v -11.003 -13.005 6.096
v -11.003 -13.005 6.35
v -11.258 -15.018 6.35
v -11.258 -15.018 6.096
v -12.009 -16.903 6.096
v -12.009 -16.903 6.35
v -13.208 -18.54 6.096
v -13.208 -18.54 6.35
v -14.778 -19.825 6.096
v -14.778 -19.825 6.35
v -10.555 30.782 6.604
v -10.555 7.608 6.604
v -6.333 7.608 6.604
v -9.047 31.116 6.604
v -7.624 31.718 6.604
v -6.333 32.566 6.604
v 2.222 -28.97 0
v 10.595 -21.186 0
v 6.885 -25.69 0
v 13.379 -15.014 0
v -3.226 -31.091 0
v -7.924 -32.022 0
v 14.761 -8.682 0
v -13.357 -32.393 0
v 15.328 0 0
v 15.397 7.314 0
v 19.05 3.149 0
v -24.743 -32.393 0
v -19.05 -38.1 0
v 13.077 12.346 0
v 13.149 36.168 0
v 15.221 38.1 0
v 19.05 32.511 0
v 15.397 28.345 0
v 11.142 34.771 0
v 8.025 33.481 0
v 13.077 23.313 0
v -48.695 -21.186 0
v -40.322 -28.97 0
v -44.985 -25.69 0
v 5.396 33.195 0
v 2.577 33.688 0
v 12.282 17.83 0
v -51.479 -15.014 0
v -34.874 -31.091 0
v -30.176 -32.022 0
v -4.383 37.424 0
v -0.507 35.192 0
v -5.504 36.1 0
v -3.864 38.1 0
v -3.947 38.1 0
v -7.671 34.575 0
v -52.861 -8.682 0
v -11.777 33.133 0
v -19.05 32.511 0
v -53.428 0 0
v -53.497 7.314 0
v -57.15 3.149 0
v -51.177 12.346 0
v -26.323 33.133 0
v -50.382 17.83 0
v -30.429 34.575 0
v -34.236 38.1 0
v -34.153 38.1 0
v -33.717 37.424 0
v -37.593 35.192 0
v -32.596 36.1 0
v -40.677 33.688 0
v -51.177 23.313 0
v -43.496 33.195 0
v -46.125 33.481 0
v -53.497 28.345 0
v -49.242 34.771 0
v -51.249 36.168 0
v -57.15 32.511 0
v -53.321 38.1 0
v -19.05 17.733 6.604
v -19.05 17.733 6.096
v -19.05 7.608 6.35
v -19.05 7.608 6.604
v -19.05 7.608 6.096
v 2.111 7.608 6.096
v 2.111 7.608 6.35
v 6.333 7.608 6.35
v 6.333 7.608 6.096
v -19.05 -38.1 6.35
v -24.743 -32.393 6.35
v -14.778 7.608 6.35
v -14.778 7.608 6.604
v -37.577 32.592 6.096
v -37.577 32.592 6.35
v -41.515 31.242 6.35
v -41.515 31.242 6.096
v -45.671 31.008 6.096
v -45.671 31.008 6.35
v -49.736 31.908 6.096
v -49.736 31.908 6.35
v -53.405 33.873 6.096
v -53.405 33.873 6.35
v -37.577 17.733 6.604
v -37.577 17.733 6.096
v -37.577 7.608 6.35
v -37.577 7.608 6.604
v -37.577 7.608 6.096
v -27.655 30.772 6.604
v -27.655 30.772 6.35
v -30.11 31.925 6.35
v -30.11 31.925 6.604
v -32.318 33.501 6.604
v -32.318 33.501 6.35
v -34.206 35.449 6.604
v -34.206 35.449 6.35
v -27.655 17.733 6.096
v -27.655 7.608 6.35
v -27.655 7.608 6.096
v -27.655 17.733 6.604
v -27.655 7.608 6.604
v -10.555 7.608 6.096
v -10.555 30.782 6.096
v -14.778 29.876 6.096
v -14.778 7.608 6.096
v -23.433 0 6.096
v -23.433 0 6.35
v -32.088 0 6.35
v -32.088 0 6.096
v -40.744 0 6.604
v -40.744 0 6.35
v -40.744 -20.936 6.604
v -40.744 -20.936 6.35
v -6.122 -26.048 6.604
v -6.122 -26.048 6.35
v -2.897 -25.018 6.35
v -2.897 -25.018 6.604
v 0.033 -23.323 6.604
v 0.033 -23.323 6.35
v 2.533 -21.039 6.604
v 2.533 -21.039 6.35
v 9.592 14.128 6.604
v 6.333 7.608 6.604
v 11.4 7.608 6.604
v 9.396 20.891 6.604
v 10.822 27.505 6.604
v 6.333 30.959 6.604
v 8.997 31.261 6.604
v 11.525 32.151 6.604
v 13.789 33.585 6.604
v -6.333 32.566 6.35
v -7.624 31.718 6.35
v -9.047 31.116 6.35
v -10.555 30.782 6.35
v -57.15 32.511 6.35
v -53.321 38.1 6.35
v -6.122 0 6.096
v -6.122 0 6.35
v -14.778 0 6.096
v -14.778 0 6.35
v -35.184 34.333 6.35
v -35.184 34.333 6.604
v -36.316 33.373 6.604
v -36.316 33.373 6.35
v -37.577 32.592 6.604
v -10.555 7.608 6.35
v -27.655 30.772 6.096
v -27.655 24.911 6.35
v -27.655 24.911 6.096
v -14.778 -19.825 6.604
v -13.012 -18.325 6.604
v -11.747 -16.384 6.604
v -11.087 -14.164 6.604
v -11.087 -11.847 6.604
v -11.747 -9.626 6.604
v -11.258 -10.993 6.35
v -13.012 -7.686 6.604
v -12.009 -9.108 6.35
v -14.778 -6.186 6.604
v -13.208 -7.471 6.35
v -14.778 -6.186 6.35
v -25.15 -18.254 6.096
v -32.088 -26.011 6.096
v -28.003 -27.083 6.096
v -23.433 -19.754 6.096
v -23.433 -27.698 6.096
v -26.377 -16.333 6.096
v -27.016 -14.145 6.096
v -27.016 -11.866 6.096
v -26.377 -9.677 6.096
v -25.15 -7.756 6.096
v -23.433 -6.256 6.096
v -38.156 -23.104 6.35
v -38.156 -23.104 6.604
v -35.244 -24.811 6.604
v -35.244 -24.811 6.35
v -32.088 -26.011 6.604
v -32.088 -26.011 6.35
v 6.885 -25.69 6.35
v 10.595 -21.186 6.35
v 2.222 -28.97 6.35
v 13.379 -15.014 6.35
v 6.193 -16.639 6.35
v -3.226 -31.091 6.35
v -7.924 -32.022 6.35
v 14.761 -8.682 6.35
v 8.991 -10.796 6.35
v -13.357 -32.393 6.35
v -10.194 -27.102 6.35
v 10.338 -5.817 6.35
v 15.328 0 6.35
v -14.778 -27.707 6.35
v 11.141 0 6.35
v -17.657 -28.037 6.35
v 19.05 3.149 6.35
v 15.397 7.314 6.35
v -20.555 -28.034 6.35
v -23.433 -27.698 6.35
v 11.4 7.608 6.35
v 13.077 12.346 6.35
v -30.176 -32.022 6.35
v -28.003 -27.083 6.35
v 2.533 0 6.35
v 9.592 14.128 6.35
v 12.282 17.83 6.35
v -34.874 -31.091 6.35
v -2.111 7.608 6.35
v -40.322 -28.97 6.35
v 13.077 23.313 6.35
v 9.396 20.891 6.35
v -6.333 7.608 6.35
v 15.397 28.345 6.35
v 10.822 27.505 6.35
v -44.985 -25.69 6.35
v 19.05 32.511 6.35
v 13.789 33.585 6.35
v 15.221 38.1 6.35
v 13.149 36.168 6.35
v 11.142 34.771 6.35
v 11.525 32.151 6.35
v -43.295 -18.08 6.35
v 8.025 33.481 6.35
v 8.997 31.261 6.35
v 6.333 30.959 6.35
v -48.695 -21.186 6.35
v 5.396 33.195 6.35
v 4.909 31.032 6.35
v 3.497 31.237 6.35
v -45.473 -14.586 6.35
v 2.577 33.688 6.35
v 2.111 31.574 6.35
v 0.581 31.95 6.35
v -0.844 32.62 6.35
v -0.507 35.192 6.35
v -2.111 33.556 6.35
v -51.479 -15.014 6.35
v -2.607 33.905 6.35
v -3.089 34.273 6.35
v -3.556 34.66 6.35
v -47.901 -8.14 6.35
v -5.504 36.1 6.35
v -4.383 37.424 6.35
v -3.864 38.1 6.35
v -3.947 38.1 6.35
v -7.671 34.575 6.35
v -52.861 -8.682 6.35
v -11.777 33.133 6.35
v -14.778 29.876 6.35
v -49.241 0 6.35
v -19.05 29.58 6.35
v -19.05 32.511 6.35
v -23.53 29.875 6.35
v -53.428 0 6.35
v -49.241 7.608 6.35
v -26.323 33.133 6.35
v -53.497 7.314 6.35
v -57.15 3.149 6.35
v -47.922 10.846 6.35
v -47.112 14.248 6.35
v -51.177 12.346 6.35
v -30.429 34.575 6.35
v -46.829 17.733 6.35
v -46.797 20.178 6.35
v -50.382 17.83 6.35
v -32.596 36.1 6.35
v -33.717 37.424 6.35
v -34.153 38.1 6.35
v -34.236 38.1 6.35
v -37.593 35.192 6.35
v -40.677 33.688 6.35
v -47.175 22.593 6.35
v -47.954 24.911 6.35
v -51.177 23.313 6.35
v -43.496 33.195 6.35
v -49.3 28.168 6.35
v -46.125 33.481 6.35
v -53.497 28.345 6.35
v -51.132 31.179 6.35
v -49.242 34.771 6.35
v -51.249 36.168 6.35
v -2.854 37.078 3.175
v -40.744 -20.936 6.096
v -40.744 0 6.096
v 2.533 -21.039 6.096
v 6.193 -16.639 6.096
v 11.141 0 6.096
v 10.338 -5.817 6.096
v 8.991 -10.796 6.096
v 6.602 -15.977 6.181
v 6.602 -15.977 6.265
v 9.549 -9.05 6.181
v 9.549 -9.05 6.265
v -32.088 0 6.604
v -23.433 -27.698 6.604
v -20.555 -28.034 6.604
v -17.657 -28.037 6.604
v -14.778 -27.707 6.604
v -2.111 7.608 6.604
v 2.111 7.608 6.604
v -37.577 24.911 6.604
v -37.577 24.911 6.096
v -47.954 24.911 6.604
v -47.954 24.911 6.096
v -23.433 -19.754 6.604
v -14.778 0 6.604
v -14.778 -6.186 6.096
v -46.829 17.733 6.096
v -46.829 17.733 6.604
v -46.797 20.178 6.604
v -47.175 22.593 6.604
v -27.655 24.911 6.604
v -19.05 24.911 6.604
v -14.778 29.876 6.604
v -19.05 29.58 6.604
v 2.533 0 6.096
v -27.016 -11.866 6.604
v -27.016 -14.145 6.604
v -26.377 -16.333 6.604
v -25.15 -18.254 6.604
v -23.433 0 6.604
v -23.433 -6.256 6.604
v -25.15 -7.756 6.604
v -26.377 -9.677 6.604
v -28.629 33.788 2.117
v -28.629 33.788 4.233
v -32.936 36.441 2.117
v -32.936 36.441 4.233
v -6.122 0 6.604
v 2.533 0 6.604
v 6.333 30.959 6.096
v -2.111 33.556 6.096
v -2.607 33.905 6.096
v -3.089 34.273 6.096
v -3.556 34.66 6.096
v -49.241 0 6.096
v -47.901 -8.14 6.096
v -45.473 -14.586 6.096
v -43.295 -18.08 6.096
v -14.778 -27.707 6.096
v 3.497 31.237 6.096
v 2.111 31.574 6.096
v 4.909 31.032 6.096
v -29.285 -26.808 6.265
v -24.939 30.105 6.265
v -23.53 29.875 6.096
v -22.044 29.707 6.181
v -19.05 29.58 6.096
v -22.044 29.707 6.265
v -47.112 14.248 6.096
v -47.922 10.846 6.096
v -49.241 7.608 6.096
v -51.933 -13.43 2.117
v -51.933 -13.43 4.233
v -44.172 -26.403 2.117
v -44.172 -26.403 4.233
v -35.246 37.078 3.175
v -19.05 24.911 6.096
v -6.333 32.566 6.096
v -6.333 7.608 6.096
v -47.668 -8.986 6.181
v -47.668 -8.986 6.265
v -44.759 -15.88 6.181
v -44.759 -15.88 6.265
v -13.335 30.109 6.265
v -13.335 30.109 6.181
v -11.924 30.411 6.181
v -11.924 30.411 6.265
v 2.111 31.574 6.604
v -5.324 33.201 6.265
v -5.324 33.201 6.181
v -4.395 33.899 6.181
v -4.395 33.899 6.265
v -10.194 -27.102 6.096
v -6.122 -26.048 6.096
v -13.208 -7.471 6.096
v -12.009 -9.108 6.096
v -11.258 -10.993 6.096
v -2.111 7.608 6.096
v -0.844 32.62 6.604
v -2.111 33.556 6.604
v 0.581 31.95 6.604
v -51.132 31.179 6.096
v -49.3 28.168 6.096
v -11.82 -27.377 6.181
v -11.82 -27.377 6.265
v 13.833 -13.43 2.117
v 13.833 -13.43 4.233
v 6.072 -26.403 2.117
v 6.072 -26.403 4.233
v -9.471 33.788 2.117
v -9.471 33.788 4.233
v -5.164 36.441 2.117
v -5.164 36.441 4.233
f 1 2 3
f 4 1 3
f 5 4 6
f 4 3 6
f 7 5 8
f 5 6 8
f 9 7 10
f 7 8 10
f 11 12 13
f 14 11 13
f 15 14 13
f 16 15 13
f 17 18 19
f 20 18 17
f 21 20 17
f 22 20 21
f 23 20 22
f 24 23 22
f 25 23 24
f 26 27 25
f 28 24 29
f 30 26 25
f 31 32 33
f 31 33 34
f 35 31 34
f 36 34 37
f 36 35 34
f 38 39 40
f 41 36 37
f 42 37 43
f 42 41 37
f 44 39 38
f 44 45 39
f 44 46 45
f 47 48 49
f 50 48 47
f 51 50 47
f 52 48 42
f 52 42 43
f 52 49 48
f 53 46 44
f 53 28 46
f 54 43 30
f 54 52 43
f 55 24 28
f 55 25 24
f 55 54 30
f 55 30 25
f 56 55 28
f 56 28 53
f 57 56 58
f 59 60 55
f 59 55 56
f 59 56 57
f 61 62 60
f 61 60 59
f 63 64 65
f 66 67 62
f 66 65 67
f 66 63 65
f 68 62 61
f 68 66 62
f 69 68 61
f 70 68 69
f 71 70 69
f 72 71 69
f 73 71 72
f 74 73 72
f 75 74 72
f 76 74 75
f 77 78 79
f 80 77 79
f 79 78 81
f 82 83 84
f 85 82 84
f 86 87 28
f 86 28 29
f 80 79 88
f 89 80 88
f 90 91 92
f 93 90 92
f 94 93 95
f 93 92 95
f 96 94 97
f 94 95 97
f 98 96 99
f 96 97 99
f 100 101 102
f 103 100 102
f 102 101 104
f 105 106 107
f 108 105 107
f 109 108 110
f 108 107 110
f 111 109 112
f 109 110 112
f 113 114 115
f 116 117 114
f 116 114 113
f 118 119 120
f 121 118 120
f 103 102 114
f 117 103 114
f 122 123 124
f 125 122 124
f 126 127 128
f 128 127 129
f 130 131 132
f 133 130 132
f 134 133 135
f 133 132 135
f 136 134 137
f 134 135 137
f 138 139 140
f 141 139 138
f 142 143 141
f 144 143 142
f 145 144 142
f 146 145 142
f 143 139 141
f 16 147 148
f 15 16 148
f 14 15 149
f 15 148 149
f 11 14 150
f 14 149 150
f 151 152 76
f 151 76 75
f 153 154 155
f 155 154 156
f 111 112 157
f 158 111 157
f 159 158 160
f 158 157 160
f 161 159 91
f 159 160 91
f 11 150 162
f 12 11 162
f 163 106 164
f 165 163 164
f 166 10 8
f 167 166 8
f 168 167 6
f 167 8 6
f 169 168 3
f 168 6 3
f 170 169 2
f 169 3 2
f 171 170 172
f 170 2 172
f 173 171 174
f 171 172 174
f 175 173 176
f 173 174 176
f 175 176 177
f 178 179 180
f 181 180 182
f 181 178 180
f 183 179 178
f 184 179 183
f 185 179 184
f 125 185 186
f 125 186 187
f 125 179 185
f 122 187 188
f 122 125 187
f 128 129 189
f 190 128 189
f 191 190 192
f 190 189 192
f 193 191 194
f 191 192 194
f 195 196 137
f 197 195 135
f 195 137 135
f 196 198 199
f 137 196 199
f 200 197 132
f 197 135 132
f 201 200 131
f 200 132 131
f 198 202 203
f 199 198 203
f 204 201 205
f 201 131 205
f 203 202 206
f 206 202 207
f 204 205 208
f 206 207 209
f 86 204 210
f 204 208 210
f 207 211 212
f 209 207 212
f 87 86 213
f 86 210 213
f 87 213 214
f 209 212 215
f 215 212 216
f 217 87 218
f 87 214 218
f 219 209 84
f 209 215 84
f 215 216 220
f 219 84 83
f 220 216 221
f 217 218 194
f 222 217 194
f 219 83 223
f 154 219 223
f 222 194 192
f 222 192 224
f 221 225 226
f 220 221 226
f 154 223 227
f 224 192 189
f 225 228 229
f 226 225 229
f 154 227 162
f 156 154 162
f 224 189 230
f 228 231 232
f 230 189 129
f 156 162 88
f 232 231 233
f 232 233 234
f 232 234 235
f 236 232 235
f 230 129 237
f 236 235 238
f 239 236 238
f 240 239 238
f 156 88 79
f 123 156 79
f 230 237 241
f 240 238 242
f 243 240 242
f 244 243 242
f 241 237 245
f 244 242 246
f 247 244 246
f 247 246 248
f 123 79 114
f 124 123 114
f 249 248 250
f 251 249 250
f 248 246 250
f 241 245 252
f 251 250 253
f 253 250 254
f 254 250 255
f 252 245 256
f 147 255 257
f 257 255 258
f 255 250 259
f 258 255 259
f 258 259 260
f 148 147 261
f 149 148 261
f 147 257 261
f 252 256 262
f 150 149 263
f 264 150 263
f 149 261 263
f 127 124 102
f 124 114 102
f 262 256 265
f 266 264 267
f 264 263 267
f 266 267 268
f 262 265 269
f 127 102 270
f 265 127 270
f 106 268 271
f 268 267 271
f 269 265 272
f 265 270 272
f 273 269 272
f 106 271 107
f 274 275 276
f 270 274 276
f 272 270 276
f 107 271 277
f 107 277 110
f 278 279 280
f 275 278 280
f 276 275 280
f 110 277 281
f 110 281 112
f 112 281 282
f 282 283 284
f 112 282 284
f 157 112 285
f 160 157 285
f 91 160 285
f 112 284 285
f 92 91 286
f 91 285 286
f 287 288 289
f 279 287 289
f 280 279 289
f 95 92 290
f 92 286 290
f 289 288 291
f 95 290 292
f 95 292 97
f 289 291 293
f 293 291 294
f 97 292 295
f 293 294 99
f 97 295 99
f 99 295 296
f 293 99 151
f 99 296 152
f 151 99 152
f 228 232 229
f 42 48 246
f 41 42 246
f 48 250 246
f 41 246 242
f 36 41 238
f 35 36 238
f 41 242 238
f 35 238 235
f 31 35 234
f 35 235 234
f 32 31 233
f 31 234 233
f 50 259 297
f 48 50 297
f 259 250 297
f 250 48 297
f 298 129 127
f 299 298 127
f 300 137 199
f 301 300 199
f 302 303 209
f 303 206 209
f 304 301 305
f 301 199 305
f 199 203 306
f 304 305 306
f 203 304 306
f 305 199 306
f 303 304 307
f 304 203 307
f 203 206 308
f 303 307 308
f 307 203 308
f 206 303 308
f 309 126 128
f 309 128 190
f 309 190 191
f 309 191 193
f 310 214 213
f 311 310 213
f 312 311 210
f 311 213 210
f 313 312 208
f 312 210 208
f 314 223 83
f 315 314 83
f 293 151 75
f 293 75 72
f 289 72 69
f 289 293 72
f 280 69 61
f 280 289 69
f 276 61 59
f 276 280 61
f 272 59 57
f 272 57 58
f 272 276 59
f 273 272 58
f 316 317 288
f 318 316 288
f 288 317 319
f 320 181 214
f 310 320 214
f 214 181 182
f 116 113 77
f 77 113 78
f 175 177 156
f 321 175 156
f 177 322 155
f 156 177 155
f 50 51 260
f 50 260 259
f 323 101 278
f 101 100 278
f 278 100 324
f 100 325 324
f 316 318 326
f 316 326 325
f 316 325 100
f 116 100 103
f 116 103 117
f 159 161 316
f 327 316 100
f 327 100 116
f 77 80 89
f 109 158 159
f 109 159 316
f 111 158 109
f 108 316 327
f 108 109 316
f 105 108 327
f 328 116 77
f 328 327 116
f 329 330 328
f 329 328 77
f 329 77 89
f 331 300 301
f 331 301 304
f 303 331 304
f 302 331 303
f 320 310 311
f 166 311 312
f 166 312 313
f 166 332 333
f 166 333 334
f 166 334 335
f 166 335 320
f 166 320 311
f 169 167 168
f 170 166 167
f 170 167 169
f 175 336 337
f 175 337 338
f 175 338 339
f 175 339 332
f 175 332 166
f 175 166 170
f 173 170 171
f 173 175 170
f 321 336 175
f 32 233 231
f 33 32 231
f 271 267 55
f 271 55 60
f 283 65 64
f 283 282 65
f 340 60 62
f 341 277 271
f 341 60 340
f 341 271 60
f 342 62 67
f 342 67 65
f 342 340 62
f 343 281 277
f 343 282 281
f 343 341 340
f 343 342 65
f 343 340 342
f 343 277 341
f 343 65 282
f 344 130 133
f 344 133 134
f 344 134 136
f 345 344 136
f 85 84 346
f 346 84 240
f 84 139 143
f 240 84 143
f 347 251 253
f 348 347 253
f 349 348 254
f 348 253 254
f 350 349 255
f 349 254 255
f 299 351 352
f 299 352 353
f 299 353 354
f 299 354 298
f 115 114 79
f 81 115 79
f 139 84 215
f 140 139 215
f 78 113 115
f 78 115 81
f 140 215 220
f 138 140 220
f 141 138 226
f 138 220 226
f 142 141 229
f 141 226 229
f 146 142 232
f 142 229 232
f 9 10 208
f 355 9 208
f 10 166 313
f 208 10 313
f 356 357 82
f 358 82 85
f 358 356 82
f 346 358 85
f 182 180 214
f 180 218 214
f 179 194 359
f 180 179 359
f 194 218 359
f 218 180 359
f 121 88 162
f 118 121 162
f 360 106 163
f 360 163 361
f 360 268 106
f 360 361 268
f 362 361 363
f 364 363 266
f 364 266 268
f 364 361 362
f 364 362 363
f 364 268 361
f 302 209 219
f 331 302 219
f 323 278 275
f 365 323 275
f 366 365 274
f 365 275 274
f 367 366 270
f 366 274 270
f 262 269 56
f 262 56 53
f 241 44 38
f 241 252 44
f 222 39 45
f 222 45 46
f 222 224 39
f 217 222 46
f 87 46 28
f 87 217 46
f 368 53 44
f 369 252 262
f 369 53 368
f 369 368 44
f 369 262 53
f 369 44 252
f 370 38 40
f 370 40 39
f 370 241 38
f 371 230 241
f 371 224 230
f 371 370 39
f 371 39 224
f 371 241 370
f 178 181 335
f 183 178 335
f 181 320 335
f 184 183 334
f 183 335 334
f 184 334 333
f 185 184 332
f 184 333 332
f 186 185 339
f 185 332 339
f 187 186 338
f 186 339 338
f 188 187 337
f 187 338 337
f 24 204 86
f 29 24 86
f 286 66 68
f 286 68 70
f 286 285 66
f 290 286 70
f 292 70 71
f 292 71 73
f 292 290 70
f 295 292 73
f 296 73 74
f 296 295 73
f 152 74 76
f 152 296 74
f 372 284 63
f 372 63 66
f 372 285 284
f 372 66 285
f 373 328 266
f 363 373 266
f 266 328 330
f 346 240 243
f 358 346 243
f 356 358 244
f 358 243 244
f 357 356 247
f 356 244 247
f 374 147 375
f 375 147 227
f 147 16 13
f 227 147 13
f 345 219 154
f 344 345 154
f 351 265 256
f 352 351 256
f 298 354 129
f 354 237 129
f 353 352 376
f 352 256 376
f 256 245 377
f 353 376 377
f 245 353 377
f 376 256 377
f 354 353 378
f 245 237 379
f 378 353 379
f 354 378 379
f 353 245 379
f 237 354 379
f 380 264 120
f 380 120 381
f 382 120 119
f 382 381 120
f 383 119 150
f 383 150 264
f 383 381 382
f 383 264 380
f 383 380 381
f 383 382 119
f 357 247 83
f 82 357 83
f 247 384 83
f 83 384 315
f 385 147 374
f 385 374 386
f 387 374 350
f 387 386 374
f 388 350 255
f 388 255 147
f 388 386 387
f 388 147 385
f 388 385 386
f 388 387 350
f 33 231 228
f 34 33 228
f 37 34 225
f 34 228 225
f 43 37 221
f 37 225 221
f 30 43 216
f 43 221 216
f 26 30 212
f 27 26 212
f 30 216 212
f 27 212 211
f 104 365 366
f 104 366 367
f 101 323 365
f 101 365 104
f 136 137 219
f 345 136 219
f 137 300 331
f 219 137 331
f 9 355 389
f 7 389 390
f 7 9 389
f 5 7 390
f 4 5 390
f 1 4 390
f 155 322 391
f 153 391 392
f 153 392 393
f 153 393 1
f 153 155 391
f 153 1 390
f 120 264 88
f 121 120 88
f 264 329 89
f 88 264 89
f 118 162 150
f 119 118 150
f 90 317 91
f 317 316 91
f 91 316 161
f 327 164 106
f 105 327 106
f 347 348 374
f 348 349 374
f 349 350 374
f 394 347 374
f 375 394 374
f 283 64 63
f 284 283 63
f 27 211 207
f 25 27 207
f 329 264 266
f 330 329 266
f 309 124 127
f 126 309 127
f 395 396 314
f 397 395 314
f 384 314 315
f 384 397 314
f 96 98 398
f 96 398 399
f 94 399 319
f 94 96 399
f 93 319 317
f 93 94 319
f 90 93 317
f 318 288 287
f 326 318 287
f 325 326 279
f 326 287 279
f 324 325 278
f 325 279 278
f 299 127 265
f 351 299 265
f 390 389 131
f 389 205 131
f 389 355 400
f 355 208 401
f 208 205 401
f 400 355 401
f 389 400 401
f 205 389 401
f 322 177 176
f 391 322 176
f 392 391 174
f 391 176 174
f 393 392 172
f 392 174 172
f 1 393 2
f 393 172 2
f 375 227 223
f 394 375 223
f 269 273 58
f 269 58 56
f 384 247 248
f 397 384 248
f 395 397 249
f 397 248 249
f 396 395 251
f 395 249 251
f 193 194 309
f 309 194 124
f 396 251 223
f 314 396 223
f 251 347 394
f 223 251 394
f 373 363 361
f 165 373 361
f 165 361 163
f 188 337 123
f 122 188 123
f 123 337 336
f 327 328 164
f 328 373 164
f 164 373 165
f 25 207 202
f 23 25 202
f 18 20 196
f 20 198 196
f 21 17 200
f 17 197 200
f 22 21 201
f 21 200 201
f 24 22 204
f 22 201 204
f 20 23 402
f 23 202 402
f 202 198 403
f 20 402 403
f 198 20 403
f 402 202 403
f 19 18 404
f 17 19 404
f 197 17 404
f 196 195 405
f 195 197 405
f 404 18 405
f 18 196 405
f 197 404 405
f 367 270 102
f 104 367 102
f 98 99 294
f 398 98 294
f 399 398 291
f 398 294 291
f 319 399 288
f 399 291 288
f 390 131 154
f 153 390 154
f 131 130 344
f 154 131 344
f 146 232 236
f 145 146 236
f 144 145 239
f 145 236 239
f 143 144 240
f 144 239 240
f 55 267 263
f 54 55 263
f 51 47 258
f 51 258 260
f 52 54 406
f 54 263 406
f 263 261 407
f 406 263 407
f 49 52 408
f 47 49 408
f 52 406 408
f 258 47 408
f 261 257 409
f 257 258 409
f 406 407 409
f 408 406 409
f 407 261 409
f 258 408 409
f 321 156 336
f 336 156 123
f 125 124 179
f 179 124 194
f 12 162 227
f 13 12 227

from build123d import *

# Parameters (mm, degrees)
F0_W     = 38.1
F0_H     = 76.2
F1_DEPTH = 6.35
F3_DEPTH = 6.35
F5_W     = 8.6051712304
F5_H     = 10.1246496194
F6_DEPTH = 0.254
F8_DEPTH = 0.254


with BuildPart() as f1:
    # F0 (on Top) → F1 (new body)
    with BuildSketch(Plane.XY):
        Rectangle(F0_W, F0_H)
    extrude(amount=F1_DEPTH)

    # F2 (on face) → F3 (cut)
    with BuildSketch(Plane.XY.offset(6.35)):
        with BuildLine():
            Line((-3.9472845383, 38.1), (-3.8636967831, 38.1))
            add(Edge.make_bspline(
                [(-3.9472845383, 38.1), (-3.9204592136, 38.1251084892), (-3.8998782769, 38.127174182), (-3.8636967831, 38.1)],
                knots=[0.4563634252, 0.4563634252, 0.4563634252, 0.4563634252, 0.4871979804, 0.4871979804, 0.4871979804, 0.4871979804], degree=3))
        make_face()
        with BuildLine():
            add(Edge.make_bspline(
                [(-19.05, 32.5106605887), (-6.1091777888, 32.3092094071), (-4.3443097915, 37.7283845811), (-3.9472845383, 38.1)],
                knots=[0, 0, 0, 0, 0.4563634252, 0.4563634252, 0.4563634252, 0.4563634252], degree=3))
            Line((-3.9472845383, 38.1), (-19.05, 38.1))
            Line((-19.05, 38.1), (-19.05, 32.5106605887))
        make_face()
        with BuildLine():
            Line((19.05, -38.1), (19.05, 3.1485415529))
            Line((19.05, 3.1485415529), (15.3276119381, 0))
            add(Edge.make_bspline(
                [(15.3276119381, 0), (15.1655543596, -11.4850010723), (13.7070389464, -32.0684760809), (-13.3565291762, -32.3926247656)],
                knots=[0, 0, 0, 0, 43.2673328352, 43.2673328352, 43.2673328352, 43.2673328352], degree=3))
            Line((-13.3565291762, -32.3926247656), (-19.05, -38.1))
            Line((-19.05, -38.1), (19.05, -38.1))
        make_face()
        with BuildLine():
            Line((19.05, 3.1485415529), (19.05, 32.5106605887))
            ThreePointArc((19.05, 32.5106605887), (12.2820636744, 17.8296010708), (19.05, 3.1485415529))
        make_face()
        Polygon((15.2206547403, 38.1), (19.05, 32.5106605887), (19.05, 38.1), align=None)
        with BuildLine():
            add(Edge.make_bspline(
                [(-3.8636967831, 38.1), (-3.843737622, 38.0850096328), (-3.0988894532, 37.3648301618), (5.2937592339, 27.6119129043), (15.2206547403, 38.1)],
                knots=[0.4871979804, 0.4871979804, 0.4871979804, 0.4871979804, 0.5042075561, 1, 1, 1, 1], degree=3))
            Line((15.2206547403, 38.1), (-3.8636967831, 38.1))
        make_face()
    extrude(amount=-F3_DEPTH, mode=Mode.SUBTRACT)

    # F4: F1 across face


with BuildPart() as f1_1:
    add(f1.part)
    add(f1.part.mirror(Plane(origin=(-19.05, -2.7946697056, 3.175), x_dir=(0, -1, 0), z_dir=(-1, 0, 0))))

    # F5 (on face) → F6 (cut)
    with BuildSketch(Plane.XY.offset(6.35)):
        with BuildLine():
            ThreePointArc((-37.5772565603, 32.5917619335), (-45.671204203, 31.008244813), (-53.4049263852, 33.873389857))
            ThreePointArc((-53.4049263852, 33.873389857), (-50.1581802259, 29.7090041206), (-47.9535559256, 24.9107647687))
            Line((-47.9535559256, 24.9107647687), (-37.5772565603, 24.9107647687))
            Line((-37.5772565603, 24.9107647687), (-37.5772565603, 32.5917619335))
        make_face()
        with BuildLine():
            Line((-37.5772565603, 17.7330877632), (-46.8293691707, 17.7330877632))
            ThreePointArc((-46.8293691707, 17.7330877632), (-47.4515529833, 12.5316587806), (-49.2414900542, 7.6084381438))
            Line((-49.2414900542, 7.6084381438), (-37.5772565603, 7.6084381438))
            Line((-37.5772565603, 7.6084381438), (-37.5772565603, 17.7330877632))
        make_face()
        with Locations((-23.3525856152, 12.6707629535)):
            Rectangle(F5_W, F5_H)
        with BuildLine():
            add(Edge.make_bspline(
                [(-27.6551712304, 30.7719508767), (-25.0542603527, 29.9722405749), (-22.0663375313, 29.5693060648), (-19.05, 29.5798139295)],
                knots=[8.2498540023, 8.2498540023, 8.2498540023, 8.2498540023, 15.7954011192, 15.7954011192, 15.7954011192, 15.7954011192], degree=3))
            Line((-27.6551712304, 30.7719508767), (-27.6551712304, 24.9107647687))
            Line((-27.6551712304, 24.9107647687), (-19.05, 24.9107647687))
            Line((-19.05, 24.9107647687), (-19.05, 29.5798139295))
        make_face()
        with BuildLine():
            add(Edge.make_bspline(
                [(-14.7775728256, 29.8755089086), (-13.3218013512, 30.0752082684), (-11.9002315961, 30.3766424012), (-10.555408895, 30.7817886934)],
                knots=[19.3738855113, 19.3738855113, 19.3738855113, 19.3738855113, 23.0815953476, 23.0815953476, 23.0815953476, 23.0815953476], degree=3))
            Line((-14.7775728256, 29.8755089086), (-14.7775728256, 7.6084381438))
            Line((-14.7775728256, 7.6084381438), (-10.555408895, 7.6084381438))
            Line((-10.555408895, 7.6084381438), (-10.555408895, 30.7817886934))
        make_face()
        with BuildLine():
            add(Edge.make_bspline(
                [(-6.3332454301, 32.5660842134), (-5.2855915186, 33.1701122102), (-4.348215472, 33.8675739108), (-3.5563470113, 34.6601066929)],
                knots=[27.291897076, 27.291897076, 27.291897076, 27.291897076, 30.7735982336, 30.7735982336, 30.7735982336, 30.7735982336], degree=3))
            Line((-6.3332454301, 32.5660842134), (-6.3332454301, 7.6084381438))
            Line((-6.3332454301, 7.6084381438), (-2.1110819653, 7.6084381438))
            Line((-2.1110819653, 7.6084381438), (-2.1110819653, 33.5563536252))
            ThreePointArc((-2.1110819653, 33.5563536252), (-2.8501925125, 34.0866536733), (-3.5563470113, 34.6601066929))
        make_face()
        with BuildLine():
            ThreePointArc((6.3332458958, 30.9586713834), (4.2005089038, 31.1180342806), (2.1110812668, 31.5743847599))
            Line((2.1110812668, 31.5743847599), (2.1110812668, 7.6084381438))
            Line((2.1110812668, 7.6084381438), (6.3332458958, 7.6084381438))
            Line((6.3332458958, 7.6084381438), (6.3332458958, 30.9586713834))
        make_face()
        with BuildLine():
            Line((11.1414900542, 0), (2.5332975201, 0))
            Line((2.5332975201, 0), (2.5332975201, -21.0394149611))
            add(Edge.make_bspline(
                [(2.5332975201, -21.0394149611), (7.0844292813, -16.8218684935), (10.3040141885, -10.1988507211), (11.1414900542, 0)],
                knots=[0.7794890643, 0.7794890643, 0.7794890643, 0.7794890643, 1, 1, 1, 1], degree=3))
        make_face()
        with BuildLine():
            Line((-6.1221369542, 0), (-14.7775728256, 0))
            Line((-14.7775728256, 0), (-14.7775728256, -6.1859292111))
            ThreePointArc((-14.7775728256, -6.1859292111), (-12.0094062526, -9.1081265301), (-11.0027304346, -13.0053803252))
            ThreePointArc((-11.0027304346, -13.0053803252), (-12.0094062526, -16.9026341203), (-14.7775728256, -19.8248314393))
            Line((-14.7775728256, -19.8248314393), (-14.7775728256, -27.7072399522))
            add(Edge.make_bspline(
                [(-14.7775728256, -27.7072399522), (-11.7973621926, -27.4741929831), (-8.8730169385, -26.9647393053), (-6.1221369542, -26.0478686811)],
                knots=[0.5504848433, 0.5504848433, 0.5504848433, 0.5504848433, 0.6567583921, 0.6567583921, 0.6567583921, 0.6567583921], degree=3))
            Line((-6.1221369542, -26.0478686811), (-6.1221369542, 0))
        make_face()
        with BuildLine():
            Line((-23.4330072999, 0), (-32.0884436369, 0))
            Line((-32.0884436369, 0), (-32.0884436369, -26.0107606504))
            add(Edge.make_bspline(
                [(-32.0884436369, -26.0107606504), (-29.3393823668, -26.9395470029), (-26.4149145694, -27.4583082328), (-23.4330072999, -27.6984636108)],
                knots=[0.341816395, 0.341816395, 0.341816395, 0.341816395, 0.4482004295, 0.4482004295, 0.4482004295, 0.4482004295], degree=3))
            Line((-23.4330072999, -27.6984636108), (-23.4330072999, -19.7542909386))
            ThreePointArc((-23.4330072999, -19.7542909386), (-27.0972695654, -13.0053803252), (-23.4330072999, -6.2564697118))
            Line((-23.4330072999, -6.2564697118), (-23.4330072999, 0))
        make_face()
        with BuildLine():
            Line((-40.7438799739, 0), (-49.2414900542, 0))
            add(Edge.make_bspline(
                [(-49.2414900542, 0), (-48.410813311, -10.1160504409), (-45.236549248, -16.7140936827), (-40.7438799739, -20.9362171076)],
                knots=[0, 0, 0, 0, 0.218720698, 0.218720698, 0.218720698, 0.218720698], degree=3))
            Line((-40.7438799739, -20.9362171076), (-40.7438799739, 0))
        make_face()
    extrude(amount=-F6_DEPTH, mode=Mode.SUBTRACT)

    # F7 (on face) → F8 (join)
    with BuildSketch(Plane.XY.offset(6.35)):
        with BuildLine():
            Line((-40.7438799739, 0), (-40.7438799765, -20.9362171051))
            ThreePointArc((-40.7438799765, -20.9362171051), (-36.7357760167, -24.0186414564), (-32.0884436271, -26.0107606537))
            Line((-32.0884436271, -26.0107606537), (-32.0884436369, 0))
            Line((-32.0884436369, 0), (-40.7438799739, 0))
        make_face()
        with BuildLine():
            Line((-10.5554089048, 30.7817886905), (-10.555408895, 7.6084381438))
            Line((-10.555408895, 7.6084381438), (-6.3332454301, 7.6084381438))
            Line((-6.3332454301, 7.6084381438), (-6.3332454301, 32.5660842134))
            ThreePointArc((-6.3332454301, 32.5660842134), (-8.3220779988, 31.3846592732), (-10.5554089048, 30.7817886905))
        make_face()
        with BuildLine():
            Line((-2.1110819653, 33.5563536252), (-2.1110819653, 7.6084381438))
            Line((-2.1110819653, 7.6084381438), (2.1110812668, 7.6084381438))
            Line((2.1110812668, 7.6084381438), (2.1110812668, 31.5743847599))
            ThreePointArc((2.1110812668, 31.5743847599), (-0.1480933869, 32.2498884656), (-2.1110819653, 33.5563536252))
        make_face()
        Polygon((-19.05, 17.7330877632), (-19.05, 7.6084381438), (-14.7775728256, 7.6084381438), (-14.7775728256, 29.8755089086), (-19.05, 29.5798139295), (-19.05, 24.9107647687), align=None)
        with BuildLine():
            Line((-6.1221369542, 0), (-6.1221369542, -26.0478686811))
            ThreePointArc((-6.122136964, -26.0478686844), (-1.3860461596, -24.2493787213), (2.5332975225, -21.0394149589))
            Line((2.5332975201, -21.0394149611), (2.5332975201, 0))
            Line((2.5332975201, 0), (-6.1221369542, 0))
        make_face()
        with BuildLine():
            Line((-23.4330072999, -19.7542909386), (-23.4330072999, -27.6984636108))
            ThreePointArc((-23.4330072999, -27.6984636108), (-19.1056699461, -28.0775017142), (-14.7775728256, -27.7072399522))
            Line((-14.7775728256, -27.7072399522), (-14.7775728256, -19.8248314393))
            ThreePointArc((-14.7775728256, -19.8248314393), (-11.0027304346, -13.0053803252), (-14.7775728256, -6.1859292111))
            Line((-14.7775728256, -6.1859292111), (-14.7775728256, 0))
            Line((-14.7775728256, 0), (-23.4330072999, 0))
            Line((-23.4330072999, 0), (-23.4330072999, -6.2564697118))
            ThreePointArc((-23.4330072999, -6.2564697118), (-27.0972695654, -13.0053803252), (-23.4330072999, -19.7542909386))
        make_face()
        with BuildLine():
            Line((6.3332458958, 30.9586713834), (6.3332458958, 7.6084381438))
            Line((6.3332458958, 7.6084381438), (11.3998418674, 7.6084381438))
            ThreePointArc((11.3998418674, 7.6084381438), (9.3955290294, 20.8910955307), (13.7893487286, 33.5852125012))
            ThreePointArc((13.7893487286, 33.5852125012), (10.2858459166, 31.6345038021), (6.3332458958, 30.9586713834))
        make_face()
        with BuildLine():
            Line((-37.5772565603, 17.7330877632), (-37.5772565603, 7.6084381438))
            Line((-37.5772565603, 7.6084381438), (-27.6551712304, 7.6084381438))
            Line((-27.6551712304, 7.6084381438), (-27.6551712304, 17.7330877632))
            Line((-27.6551712304, 17.7330877632), (-19.05, 17.7330877632))
            Line((-19.05, 17.7330877632), (-19.05, 24.9107647687))
            Line((-19.05, 24.9107647687), (-27.6551712304, 24.9107647687))
            Line((-27.6551712304, 24.9107647687), (-27.6551712305, 30.7719508767))
            ThreePointArc((-27.6551712305, 30.7719508767), (-31.2495313727, 32.6633513709), (-34.2058315873, 35.4485101998))
            ThreePointArc((-34.2058315873, 35.4485101998), (-35.7322331398, 33.8321233993), (-37.5772565603, 32.5917619335))
            Line((-37.5772565603, 32.5917619335), (-37.5772565603, 24.9107647687))
            Line((-37.5772565603, 24.9107647687), (-47.9535559256, 24.9107647687))
            ThreePointArc((-47.9535559256, 24.9107647687), (-46.9346789734, 21.3934689174), (-46.8293691707, 17.7330877632))
            Line((-46.8293691707, 17.7330877632), (-37.5772565603, 17.7330877632))
        make_face()
    extrude(amount=F8_DEPTH)


solid = f1_1.part
